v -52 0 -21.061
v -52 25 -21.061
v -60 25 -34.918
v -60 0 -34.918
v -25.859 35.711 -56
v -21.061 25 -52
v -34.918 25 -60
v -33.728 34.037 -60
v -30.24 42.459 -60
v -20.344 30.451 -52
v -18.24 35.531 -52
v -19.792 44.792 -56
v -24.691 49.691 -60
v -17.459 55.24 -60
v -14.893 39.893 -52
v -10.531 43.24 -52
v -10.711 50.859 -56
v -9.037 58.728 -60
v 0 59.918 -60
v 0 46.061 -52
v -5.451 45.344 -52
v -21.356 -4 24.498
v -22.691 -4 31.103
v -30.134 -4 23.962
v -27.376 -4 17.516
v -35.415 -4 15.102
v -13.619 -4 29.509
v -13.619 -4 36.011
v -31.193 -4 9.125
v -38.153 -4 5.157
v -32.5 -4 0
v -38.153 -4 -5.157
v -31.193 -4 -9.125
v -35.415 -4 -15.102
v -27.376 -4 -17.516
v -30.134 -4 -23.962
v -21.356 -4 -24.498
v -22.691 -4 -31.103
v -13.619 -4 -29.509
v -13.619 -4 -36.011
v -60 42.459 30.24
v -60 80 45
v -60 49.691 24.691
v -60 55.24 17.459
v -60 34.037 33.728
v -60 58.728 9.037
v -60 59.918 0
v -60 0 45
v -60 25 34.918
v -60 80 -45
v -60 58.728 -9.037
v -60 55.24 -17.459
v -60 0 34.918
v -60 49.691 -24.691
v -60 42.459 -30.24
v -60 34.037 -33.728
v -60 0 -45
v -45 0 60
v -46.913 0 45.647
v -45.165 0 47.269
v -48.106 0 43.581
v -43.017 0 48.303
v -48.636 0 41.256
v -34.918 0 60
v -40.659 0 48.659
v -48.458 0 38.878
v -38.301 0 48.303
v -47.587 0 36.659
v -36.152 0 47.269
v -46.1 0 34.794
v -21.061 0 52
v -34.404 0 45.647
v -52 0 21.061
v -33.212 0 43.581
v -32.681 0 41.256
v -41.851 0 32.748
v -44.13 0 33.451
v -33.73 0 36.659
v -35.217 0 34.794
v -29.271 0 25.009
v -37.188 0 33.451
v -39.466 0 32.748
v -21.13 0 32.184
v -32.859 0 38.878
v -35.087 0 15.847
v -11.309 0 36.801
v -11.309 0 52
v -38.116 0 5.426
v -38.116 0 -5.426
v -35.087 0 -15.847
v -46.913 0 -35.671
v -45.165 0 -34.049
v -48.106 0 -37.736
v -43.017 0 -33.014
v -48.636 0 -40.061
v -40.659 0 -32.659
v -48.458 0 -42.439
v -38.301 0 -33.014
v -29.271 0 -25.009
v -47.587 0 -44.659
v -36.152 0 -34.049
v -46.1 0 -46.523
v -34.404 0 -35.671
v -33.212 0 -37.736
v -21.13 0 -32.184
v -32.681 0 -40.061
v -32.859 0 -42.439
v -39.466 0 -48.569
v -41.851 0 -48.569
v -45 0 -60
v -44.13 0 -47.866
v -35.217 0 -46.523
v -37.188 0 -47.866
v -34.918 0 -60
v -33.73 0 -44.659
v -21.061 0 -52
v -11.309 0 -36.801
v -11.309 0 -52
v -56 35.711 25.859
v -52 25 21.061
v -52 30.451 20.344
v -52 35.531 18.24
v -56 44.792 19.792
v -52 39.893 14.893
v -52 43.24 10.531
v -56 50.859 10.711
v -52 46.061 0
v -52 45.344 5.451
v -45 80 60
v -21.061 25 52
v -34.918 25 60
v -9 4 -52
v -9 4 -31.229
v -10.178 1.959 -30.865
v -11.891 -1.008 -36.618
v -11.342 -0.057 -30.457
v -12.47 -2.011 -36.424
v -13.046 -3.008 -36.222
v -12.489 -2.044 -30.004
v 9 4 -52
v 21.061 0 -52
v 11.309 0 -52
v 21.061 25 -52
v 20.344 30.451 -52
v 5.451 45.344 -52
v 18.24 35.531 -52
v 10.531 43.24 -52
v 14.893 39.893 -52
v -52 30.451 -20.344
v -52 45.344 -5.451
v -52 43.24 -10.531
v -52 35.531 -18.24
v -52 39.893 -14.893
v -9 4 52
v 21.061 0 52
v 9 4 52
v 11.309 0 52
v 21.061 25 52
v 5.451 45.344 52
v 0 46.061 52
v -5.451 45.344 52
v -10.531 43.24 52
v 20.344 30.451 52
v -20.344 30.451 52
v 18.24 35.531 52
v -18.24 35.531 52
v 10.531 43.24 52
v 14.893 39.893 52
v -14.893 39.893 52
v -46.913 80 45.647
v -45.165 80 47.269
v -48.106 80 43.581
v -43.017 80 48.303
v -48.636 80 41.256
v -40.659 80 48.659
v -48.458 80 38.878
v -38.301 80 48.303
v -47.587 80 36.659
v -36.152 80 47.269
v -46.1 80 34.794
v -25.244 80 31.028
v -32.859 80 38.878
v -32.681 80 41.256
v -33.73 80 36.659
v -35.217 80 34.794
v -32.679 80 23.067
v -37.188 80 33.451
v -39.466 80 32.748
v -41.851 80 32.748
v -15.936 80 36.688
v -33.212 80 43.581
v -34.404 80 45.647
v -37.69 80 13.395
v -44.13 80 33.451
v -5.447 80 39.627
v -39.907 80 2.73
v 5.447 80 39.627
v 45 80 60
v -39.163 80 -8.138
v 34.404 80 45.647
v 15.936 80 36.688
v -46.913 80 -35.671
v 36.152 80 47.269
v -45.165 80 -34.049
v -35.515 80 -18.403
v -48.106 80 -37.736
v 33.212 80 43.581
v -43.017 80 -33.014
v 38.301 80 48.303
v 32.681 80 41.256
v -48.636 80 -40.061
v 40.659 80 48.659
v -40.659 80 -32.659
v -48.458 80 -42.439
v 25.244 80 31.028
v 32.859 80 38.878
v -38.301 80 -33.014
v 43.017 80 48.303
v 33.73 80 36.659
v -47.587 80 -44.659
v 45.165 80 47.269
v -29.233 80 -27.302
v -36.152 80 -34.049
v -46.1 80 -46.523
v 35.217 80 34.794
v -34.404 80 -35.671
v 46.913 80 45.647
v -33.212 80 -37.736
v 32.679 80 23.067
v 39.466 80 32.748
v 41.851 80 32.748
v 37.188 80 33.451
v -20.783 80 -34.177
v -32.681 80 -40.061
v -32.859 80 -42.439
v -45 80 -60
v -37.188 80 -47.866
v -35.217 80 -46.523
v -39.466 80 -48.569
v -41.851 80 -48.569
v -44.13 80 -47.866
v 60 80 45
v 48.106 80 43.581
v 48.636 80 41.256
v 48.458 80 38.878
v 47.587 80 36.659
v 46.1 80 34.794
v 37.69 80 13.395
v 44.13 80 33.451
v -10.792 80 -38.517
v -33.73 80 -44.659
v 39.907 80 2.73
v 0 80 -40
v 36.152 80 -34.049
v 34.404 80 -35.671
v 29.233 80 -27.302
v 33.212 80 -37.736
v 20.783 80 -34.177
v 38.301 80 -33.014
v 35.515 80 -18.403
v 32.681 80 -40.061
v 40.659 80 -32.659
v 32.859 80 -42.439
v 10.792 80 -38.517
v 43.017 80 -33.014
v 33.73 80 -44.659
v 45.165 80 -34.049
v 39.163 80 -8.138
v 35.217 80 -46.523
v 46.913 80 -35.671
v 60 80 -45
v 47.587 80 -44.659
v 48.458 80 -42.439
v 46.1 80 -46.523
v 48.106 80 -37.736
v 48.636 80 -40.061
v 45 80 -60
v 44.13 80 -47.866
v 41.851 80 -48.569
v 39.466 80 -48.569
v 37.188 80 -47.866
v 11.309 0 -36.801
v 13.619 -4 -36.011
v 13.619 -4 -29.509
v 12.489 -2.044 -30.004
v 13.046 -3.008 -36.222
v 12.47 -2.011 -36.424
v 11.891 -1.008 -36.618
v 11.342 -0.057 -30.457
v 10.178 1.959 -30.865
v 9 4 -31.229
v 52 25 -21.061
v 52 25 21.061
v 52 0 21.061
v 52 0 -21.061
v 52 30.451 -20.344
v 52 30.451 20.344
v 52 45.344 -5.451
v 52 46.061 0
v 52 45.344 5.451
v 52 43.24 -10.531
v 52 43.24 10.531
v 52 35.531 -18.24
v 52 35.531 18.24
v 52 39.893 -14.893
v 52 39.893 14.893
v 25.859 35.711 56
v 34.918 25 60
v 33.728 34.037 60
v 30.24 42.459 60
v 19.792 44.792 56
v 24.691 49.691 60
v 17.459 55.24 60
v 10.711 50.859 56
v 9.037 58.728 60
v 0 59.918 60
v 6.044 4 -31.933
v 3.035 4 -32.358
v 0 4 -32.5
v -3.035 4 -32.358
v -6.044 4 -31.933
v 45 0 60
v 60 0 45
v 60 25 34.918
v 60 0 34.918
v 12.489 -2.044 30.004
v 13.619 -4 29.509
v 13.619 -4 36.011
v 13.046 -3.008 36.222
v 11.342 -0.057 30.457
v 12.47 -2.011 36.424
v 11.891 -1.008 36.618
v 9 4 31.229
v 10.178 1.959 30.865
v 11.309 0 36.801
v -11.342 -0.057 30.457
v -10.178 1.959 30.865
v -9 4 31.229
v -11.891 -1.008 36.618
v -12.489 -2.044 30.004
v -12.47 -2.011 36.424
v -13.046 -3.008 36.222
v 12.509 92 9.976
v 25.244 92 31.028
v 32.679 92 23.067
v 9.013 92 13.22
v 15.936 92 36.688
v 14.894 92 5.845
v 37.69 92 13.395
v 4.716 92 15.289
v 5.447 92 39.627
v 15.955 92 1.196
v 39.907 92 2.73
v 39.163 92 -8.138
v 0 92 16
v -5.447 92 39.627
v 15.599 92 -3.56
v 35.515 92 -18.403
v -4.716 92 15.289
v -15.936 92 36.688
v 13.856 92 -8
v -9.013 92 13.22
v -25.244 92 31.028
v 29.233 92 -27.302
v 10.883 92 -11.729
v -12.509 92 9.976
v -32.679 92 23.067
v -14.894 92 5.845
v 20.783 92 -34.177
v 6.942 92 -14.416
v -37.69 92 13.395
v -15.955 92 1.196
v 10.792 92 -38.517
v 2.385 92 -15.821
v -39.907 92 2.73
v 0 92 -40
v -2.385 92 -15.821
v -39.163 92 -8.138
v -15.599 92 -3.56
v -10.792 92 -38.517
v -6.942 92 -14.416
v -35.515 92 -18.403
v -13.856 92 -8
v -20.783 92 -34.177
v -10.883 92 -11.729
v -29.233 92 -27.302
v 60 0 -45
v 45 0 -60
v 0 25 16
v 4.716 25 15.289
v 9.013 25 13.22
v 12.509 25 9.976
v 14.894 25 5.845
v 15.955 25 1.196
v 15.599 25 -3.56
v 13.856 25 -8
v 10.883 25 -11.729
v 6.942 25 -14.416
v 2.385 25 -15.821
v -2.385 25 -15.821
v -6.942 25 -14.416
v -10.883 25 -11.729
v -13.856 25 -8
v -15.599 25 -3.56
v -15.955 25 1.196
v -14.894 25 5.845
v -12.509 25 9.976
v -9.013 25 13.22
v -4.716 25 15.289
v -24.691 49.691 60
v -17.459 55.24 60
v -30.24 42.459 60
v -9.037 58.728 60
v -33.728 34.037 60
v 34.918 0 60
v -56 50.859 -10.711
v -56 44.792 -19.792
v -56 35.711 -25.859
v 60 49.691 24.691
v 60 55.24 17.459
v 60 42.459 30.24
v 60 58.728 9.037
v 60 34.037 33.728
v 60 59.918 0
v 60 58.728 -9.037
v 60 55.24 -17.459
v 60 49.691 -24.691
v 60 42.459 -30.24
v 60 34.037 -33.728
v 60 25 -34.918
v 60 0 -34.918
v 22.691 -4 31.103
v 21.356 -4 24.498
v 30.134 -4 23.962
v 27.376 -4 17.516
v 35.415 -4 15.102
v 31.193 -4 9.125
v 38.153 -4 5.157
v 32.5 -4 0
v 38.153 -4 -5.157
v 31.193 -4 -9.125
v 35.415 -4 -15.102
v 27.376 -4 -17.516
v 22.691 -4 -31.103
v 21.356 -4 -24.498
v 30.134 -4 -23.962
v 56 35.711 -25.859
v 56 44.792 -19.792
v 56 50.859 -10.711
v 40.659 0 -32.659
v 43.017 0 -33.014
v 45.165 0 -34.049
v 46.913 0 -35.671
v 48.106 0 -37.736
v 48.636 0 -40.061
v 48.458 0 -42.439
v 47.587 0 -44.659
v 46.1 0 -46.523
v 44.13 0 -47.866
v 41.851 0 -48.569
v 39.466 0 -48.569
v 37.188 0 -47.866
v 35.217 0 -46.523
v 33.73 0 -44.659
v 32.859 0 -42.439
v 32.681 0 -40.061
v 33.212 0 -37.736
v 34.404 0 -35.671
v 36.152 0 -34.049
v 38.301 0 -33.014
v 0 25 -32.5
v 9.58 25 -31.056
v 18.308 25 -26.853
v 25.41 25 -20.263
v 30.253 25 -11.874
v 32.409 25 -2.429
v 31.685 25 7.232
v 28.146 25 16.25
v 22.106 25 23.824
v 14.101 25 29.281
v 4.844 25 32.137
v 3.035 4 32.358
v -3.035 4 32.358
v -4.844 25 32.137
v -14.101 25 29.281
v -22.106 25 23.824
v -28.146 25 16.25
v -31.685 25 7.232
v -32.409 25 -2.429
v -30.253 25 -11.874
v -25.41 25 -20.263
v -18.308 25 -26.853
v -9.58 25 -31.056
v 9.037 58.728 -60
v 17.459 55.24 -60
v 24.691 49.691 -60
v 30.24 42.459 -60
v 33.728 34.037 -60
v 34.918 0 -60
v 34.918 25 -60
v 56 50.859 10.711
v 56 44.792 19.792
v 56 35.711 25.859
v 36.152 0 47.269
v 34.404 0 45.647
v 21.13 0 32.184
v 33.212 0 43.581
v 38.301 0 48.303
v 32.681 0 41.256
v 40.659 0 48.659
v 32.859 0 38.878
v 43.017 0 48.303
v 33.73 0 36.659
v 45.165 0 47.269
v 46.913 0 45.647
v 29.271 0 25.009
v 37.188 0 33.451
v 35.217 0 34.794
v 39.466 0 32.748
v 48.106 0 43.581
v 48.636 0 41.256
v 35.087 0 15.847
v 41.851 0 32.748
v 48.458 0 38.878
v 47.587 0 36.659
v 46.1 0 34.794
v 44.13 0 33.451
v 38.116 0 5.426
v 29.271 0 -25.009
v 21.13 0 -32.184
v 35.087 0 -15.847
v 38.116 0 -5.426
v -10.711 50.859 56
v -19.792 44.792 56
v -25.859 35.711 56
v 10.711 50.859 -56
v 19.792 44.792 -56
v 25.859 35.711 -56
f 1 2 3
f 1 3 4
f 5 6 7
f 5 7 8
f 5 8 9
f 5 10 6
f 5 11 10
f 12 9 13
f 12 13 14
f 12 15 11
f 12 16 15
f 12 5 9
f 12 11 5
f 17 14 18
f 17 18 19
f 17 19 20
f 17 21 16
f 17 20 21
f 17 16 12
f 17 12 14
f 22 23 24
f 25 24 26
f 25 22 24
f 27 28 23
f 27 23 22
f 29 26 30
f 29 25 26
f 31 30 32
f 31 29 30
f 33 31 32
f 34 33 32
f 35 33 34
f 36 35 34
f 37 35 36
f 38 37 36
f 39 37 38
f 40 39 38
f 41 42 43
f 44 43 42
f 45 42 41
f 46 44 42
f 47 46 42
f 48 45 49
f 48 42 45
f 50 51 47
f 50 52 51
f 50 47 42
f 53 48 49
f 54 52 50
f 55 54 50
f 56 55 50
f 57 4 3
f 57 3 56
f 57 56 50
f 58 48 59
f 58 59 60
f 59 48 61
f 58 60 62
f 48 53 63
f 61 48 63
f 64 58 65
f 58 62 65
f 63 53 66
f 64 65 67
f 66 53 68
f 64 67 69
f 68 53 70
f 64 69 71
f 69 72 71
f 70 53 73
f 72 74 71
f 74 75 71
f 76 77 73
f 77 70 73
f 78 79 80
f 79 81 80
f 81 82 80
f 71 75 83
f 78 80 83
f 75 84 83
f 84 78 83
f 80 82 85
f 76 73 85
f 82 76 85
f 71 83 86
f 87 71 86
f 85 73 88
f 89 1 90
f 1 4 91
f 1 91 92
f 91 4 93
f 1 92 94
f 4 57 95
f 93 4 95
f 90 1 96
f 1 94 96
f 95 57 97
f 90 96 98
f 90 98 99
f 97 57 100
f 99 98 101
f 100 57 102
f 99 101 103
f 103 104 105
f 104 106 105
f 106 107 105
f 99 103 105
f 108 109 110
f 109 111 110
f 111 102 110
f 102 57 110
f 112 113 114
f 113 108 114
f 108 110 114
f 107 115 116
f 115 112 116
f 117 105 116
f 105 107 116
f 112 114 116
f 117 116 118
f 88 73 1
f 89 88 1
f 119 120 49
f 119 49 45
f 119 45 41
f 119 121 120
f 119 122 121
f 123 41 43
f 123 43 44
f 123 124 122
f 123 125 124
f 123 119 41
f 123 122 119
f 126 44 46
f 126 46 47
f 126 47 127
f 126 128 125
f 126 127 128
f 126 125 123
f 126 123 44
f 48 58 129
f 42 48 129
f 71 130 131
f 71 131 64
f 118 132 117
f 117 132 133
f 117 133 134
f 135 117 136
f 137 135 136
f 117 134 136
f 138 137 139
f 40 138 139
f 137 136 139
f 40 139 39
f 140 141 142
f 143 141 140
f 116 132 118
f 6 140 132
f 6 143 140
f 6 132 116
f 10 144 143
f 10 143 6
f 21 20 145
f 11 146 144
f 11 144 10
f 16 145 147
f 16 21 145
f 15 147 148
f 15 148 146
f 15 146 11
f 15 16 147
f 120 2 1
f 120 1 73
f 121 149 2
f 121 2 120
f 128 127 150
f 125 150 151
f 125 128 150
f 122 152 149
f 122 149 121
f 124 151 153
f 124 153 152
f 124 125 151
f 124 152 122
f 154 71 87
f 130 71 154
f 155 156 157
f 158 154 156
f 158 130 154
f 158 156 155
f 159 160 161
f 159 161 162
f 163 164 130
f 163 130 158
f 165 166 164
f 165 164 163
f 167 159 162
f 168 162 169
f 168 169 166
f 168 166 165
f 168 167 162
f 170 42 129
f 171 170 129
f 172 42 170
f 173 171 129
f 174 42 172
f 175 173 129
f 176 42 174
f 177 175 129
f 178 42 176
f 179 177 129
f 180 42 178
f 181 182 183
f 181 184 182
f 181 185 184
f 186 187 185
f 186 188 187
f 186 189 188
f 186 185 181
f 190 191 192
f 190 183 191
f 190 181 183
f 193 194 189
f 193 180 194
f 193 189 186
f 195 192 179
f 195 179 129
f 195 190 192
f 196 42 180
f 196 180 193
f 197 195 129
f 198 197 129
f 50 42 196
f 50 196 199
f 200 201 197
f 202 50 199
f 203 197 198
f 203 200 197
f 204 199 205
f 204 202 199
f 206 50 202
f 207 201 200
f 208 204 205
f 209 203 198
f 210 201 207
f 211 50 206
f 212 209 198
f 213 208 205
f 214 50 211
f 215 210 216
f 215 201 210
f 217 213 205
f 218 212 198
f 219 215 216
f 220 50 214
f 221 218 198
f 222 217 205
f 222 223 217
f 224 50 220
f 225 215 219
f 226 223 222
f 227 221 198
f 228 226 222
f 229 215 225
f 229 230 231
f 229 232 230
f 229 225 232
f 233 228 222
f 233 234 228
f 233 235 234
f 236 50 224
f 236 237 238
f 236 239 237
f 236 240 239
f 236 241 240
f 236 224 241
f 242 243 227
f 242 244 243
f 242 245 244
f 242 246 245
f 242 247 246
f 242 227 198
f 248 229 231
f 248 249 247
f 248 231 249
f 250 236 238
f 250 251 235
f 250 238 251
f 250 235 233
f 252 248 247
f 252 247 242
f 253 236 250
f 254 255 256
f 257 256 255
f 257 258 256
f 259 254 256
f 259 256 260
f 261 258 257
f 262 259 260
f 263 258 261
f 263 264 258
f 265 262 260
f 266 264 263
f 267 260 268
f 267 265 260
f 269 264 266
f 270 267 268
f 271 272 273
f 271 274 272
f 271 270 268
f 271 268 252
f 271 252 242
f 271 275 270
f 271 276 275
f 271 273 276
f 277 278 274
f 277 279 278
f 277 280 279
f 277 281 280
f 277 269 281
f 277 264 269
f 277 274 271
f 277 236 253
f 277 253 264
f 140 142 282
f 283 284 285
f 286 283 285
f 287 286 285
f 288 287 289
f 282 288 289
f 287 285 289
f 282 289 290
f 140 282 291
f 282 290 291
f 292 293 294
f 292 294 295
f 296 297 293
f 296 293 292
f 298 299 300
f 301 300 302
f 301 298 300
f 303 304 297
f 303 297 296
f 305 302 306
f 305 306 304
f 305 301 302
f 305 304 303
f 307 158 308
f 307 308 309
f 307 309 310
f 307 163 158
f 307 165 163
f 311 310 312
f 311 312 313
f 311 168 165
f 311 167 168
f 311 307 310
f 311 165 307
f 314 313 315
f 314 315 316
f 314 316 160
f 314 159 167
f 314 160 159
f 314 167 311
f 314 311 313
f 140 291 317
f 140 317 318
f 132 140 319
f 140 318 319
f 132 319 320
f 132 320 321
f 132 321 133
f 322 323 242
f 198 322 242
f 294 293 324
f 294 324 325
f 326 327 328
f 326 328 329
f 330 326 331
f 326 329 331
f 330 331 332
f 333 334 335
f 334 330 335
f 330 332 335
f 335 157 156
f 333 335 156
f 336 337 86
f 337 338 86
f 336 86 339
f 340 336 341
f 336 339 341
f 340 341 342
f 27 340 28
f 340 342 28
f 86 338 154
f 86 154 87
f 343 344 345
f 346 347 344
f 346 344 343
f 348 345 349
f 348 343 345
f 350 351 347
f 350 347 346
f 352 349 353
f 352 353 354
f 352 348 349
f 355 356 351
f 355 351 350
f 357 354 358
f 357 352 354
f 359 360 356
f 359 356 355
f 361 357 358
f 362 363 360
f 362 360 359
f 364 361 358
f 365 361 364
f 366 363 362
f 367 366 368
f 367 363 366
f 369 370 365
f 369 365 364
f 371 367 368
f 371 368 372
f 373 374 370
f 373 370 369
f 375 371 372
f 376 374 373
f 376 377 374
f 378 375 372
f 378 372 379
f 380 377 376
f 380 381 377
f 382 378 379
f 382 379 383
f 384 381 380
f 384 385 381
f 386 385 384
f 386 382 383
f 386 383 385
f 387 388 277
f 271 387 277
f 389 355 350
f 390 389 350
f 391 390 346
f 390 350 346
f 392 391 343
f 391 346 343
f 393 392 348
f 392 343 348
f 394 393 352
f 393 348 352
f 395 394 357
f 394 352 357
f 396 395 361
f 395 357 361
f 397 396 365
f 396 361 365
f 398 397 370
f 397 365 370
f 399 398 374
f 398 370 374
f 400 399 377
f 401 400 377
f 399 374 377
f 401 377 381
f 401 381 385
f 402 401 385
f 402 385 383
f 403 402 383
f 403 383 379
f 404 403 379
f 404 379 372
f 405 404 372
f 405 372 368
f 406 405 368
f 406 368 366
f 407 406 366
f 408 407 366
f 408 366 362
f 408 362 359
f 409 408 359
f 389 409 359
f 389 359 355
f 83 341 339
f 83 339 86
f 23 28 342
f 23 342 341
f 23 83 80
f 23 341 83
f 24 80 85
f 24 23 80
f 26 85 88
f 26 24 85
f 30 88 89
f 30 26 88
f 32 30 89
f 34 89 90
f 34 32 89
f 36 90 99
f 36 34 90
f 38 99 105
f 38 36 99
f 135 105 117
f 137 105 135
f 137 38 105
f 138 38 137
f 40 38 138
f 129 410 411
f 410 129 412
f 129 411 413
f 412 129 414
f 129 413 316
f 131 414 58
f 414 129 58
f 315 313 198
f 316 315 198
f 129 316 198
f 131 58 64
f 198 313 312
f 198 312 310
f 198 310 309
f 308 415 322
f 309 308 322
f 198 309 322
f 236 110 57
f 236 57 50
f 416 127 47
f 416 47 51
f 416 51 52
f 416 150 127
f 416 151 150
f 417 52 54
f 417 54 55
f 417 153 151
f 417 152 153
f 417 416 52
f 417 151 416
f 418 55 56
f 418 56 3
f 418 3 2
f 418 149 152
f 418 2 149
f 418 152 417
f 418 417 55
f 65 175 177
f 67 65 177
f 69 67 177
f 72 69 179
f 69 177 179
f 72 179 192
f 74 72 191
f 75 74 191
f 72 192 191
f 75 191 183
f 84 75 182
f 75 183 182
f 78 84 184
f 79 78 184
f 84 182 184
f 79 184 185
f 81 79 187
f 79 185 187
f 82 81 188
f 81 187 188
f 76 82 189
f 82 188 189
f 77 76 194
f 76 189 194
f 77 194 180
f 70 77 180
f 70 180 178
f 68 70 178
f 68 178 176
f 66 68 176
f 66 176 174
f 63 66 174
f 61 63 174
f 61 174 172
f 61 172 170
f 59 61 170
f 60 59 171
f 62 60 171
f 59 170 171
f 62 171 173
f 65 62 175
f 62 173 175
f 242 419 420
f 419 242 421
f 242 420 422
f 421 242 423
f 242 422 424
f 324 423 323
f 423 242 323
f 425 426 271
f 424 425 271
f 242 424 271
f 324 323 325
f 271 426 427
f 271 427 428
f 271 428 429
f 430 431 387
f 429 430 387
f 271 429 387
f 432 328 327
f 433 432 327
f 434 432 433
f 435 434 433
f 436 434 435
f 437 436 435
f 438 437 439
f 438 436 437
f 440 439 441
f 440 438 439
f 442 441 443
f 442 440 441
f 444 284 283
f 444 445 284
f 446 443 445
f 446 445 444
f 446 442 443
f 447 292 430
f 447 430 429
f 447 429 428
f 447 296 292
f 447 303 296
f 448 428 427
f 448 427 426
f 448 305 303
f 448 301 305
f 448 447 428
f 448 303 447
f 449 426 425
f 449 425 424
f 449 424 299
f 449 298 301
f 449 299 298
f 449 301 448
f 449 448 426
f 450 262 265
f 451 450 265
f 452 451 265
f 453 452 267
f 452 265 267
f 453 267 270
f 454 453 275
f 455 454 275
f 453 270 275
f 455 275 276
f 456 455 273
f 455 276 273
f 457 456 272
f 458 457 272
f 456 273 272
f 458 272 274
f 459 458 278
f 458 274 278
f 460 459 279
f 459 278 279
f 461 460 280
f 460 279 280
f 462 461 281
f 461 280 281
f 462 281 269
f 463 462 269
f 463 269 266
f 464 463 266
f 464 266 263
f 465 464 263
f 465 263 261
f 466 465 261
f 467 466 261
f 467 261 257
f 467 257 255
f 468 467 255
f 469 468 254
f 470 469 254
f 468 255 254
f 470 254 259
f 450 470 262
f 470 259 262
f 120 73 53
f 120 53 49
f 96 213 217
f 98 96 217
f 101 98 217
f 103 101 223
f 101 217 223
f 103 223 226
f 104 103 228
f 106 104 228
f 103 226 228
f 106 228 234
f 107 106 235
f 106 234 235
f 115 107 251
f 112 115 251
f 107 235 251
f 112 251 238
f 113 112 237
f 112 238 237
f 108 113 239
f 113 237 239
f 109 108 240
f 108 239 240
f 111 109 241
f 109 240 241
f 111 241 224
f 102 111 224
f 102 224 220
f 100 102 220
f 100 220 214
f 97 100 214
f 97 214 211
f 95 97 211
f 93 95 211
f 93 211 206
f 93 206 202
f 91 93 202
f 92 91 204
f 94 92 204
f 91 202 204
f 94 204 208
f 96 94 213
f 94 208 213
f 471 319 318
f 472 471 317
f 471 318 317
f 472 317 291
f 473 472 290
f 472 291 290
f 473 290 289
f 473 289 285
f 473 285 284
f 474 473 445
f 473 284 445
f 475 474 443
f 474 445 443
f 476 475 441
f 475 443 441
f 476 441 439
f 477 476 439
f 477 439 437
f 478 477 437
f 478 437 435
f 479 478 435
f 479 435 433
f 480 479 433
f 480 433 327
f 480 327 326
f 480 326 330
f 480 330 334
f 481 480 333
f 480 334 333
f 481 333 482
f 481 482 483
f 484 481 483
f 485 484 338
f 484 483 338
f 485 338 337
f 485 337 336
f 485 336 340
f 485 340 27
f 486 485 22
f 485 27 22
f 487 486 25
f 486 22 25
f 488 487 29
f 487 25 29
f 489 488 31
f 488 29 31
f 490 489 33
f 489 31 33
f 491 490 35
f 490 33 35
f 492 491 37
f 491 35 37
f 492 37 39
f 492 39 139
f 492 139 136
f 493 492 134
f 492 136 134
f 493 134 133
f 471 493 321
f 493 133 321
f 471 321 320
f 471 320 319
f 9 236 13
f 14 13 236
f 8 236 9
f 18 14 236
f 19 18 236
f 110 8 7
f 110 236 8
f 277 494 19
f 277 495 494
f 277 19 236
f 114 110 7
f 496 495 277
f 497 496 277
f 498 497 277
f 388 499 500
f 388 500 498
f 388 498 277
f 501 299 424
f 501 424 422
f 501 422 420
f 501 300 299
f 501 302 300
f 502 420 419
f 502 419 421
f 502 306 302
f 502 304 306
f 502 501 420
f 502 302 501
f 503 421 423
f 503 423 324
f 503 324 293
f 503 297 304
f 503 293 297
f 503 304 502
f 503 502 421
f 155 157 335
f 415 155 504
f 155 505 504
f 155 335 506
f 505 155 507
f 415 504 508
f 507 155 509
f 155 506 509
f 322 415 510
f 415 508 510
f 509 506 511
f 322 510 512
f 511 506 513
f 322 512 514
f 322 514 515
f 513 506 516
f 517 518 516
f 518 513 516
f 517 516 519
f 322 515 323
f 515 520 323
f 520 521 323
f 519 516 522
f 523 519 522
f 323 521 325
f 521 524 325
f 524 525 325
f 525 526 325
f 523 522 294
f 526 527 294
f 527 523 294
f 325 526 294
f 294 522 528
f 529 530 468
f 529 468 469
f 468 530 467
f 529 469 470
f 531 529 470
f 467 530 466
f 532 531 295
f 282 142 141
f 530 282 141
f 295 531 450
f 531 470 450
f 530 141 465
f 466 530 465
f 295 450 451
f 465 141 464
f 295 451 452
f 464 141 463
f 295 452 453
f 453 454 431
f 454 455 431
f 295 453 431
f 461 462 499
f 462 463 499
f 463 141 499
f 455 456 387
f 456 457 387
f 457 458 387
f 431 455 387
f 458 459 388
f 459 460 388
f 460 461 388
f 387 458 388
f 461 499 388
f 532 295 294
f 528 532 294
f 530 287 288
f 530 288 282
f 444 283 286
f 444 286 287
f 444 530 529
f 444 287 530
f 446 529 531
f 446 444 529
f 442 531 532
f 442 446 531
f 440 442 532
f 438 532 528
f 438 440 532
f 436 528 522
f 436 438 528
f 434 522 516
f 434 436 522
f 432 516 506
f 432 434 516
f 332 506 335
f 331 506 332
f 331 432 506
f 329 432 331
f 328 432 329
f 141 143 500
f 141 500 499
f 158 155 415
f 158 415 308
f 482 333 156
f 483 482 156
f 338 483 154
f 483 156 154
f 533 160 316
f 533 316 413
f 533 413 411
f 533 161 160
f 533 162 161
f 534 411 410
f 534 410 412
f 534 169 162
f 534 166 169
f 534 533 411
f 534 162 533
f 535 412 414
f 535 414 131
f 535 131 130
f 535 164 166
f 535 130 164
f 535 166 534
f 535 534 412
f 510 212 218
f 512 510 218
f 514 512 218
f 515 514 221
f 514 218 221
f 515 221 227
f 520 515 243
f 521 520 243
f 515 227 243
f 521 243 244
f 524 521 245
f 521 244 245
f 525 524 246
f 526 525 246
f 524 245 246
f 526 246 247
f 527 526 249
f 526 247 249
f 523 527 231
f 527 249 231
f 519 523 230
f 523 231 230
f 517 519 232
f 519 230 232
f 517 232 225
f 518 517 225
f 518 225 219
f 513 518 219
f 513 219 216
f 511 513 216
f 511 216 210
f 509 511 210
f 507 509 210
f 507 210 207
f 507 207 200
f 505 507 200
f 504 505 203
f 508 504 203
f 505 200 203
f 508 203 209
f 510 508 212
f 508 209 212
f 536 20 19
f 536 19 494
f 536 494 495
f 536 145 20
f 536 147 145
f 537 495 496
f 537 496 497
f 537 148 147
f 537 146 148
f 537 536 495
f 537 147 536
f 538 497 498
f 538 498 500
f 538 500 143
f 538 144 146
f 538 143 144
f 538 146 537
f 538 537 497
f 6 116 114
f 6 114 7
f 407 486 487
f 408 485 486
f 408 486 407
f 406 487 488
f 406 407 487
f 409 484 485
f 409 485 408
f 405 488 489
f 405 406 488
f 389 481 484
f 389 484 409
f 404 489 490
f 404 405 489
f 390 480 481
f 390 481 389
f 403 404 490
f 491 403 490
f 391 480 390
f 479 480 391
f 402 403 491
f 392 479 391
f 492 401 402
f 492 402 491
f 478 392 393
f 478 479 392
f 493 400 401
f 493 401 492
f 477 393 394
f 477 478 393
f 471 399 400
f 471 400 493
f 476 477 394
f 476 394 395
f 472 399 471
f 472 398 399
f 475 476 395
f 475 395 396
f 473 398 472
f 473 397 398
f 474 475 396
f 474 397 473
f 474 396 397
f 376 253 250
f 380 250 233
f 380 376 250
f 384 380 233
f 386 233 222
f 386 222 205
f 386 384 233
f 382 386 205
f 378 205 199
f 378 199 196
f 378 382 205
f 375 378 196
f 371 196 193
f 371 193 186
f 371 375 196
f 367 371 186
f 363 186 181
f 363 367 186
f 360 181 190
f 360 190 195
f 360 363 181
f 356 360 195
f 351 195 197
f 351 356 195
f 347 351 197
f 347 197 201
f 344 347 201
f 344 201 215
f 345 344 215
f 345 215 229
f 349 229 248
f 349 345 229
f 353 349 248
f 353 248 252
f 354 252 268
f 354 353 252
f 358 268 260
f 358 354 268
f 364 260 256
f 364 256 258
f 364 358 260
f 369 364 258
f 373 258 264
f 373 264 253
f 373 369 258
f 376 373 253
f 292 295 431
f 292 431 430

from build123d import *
from OCP.BRepFilletAPI import BRepFilletAPI_MakeChamfer

# Parameters (mm, degrees)
SKETCH1_W                      = 120
SKETCH1_H                      = 120
BOSS_EXTRUDE1_DEPTH            = 80
CHAMFER1_SIZE                  = 15
SKETCH2_R                      = 8
SKETCH2_R_2                    = 16
CUT_EXTRUDE1_DEPTH             = 80
CUT_EXTRUDE2_DEPTH             = 8
CHAMFER3_SIZE                  = 13.856406461
CHAMFER3_SIZE_2                = 8
CIRPATTERN2_COUNT              = 4
CHAMFER3_OF_CIRPATTERN2_SIZE   = 13.856406461
CHAMFER3_OF_CIRPATTERN2_SIZE_2 = 8
BOSS_EXTRUDE2_START            = 12
SKETCH5_R                      = 40
SKETCH5_R_2                    = 16
BOSS_EXTRUDE2_DEPTH            = 12
SKETCH6_R                      = 32.5
CUT_EXTRUDE3_DEPTH             = 25
BOSS_EXTRUDE3_START            = 4
SKETCH17_R                     = 38.5
SKETCH17_R_2                   = 32.5
BOSS_EXTRUDE3_DEPTH            = 4
CUT_EXTRUDE4_DEPTH             = 156


with BuildPart() as part:
    # Sketch1 → Boss-Extrude1 (new body)
    with BuildSketch(Plane(origin=(0, 0, 0), x_dir=(1, 0, 0), z_dir=(0, 1, 0))):
        Rectangle(SKETCH1_W, SKETCH1_H)
    extrude(amount=BOSS_EXTRUDE1_DEPTH)

    # Chamfer1
    chamfer1_edges = [part.edges().sort_by_distance(p)[0] for p in [
        (60, 40, 60),
        (-60, 40, 60),
        (-60, 40, -60),
        (60, 40, -60),
    ]]
    chamfer(chamfer1_edges, length=CHAMFER1_SIZE)

    # Sketch2 → Cut-Extrude1 (cut)
    with BuildSketch(Plane(origin=(0, 80, 0), x_dir=(1, 0, 0), z_dir=(0, 1, 0))):
        with Locations(Location((-40.658639918, 40.658639918, 0), (0, 0, 270))):
            Circle(SKETCH2_R)
        with Locations(Location((40.658639918, 40.658639918, 0), (0, 0, 270))):
            Circle(SKETCH2_R)
        with Locations(Location((40.658639918, -40.658639918, 0), (0, 0, 270))):
            Circle(SKETCH2_R)
        with Locations(Location((-40.658639918, -40.658639918, 0), (0, 0, 270))):
            Circle(SKETCH2_R)
        with Locations(Location((0, 0, 0), (0, 0, 270))):
            Circle(SKETCH2_R_2)
    extrude(amount=-CUT_EXTRUDE1_DEPTH, mode=Mode.SUBTRACT)

    # Sketch3 → Cut-Extrude2 (cut)
    with BuildSketch(Plane(origin=(60, 0, 0), x_dir=(0, 0, -1), z_dir=(1, 0, 0))):
        with BuildLine():
            Line((-21.061459243, 25), (-21.061459243, 0))
            Line((-21.061459243, 0), (0, 0))
            Line((0, 0), (0, 46.061459243))
            ThreePointArc((0, 46.061459243), (-14.892700652, 39.892700652), (-21.061459243, 25))
        make_face()
        with BuildLine():
            Line((0, 46.061459243), (0, 0))
            Line((0, 0), (21.061459243, 0))
            Line((21.061459243, 0), (21.061459243, 25))
            ThreePointArc((21.061459243, 25), (14.892700652, 39.892700652), (0, 46.061459243))
        make_face()
    cut_extrude2 = extrude(amount=-CUT_EXTRUDE2_DEPTH, mode=Mode.SUBTRACT)

    # Chamfer3
    chamfer3_edges_1 = [part.edges().sort_by_distance(p)[0] for p in [
        (60, 12.5, 21.061459243),
    ]]
    chamfer3_side_1 = [part.faces().sort_by_distance(p)[0] for p in [
        (60, 12.5, 21.221459243),
    ]]
    chamfer3_edges_2 = [part.edges().sort_by_distance(p)[0] for p in [
        (60, 46.061459243, 0),
    ]]
    chamfer3_side_2 = [part.faces().sort_by_distance(p)[0] for p in [
        (60, 46.221459243, 0),
    ]]
    chamfer3_edges_3 = [part.edges().sort_by_distance(p)[0] for p in [
        (60, 12.5, -21.061459243),
    ]]
    chamfer3_side_3 = [part.faces().sort_by_distance(p)[0] for p in [
        (60, 12.5, -21.221459243),
    ]]
    chamfer3 = BRepFilletAPI_MakeChamfer(part.part.solid().wrapped)
    for e in chamfer3_edges_1:
        chamfer3.Add(CHAMFER3_SIZE - 0.0001, CHAMFER3_SIZE_2 - 0.0001, e.wrapped, chamfer3_side_1[0].wrapped)
    for e in chamfer3_edges_2:
        chamfer3.Add(CHAMFER3_SIZE - 0.0001, CHAMFER3_SIZE_2 - 0.0001, e.wrapped, chamfer3_side_2[0].wrapped)
    for e in chamfer3_edges_3:
        chamfer3.Add(CHAMFER3_SIZE - 0.0001, CHAMFER3_SIZE_2 - 0.0001, e.wrapped, chamfer3_side_3[0].wrapped)
    add(Compound.cast(chamfer3.Shape()), mode=Mode.REPLACE)  # a hair under: the kernel refuses the full size

    # CirPattern2: Cut-Extrude2 ×4 about axis
    cirpattern2_axis = Axis((0, 0, 0), (0, 1, 0))
    for i in range(1, CIRPATTERN2_COUNT):
        add(cut_extrude2.rotate(cirpattern2_axis, i * 360 / CIRPATTERN2_COUNT), mode=Mode.SUBTRACT)

    # Chamfer3 of CirPattern2
    chamfer3_of_cirpattern2_edges_1 = [part.edges().sort_by_distance(p)[0] for p in [
        (21.061459243, 12.5, -60),
    ]]
    chamfer3_of_cirpattern2_side_1 = [part.faces().sort_by_distance(p)[0] for p in [
        (21.221459243, 12.5, -60),
    ]]
    chamfer3_of_cirpattern2_edges_2 = [part.edges().sort_by_distance(p)[0] for p in [
        (0, 46.061459243, -60),
    ]]
    chamfer3_of_cirpattern2_side_2 = [part.faces().sort_by_distance(p)[0] for p in [
        (0, 46.221459243, -60),
    ]]
    chamfer3_of_cirpattern2_edges_3 = [part.edges().sort_by_distance(p)[0] for p in [
        (-21.061459243, 12.5, -60),
    ]]
    chamfer3_of_cirpattern2_side_3 = [part.faces().sort_by_distance(p)[0] for p in [
        (-21.221459243, 12.5, -60),
    ]]
    chamfer3_of_cirpattern2_edges_4 = [part.edges().sort_by_distance(p)[0] for p in [
        (-60, 12.5, -21.061459243),
    ]]
    chamfer3_of_cirpattern2_side_4 = [part.faces().sort_by_distance(p)[0] for p in [
        (-60, 12.5, -21.221459243),
    ]]
    chamfer3_of_cirpattern2_edges_5 = [part.edges().sort_by_distance(p)[0] for p in [
        (-60, 46.061459243, 0),
    ]]
    chamfer3_of_cirpattern2_side_5 = [part.faces().sort_by_distance(p)[0] for p in [
        (-60, 46.221459243, 0),
    ]]
    chamfer3_of_cirpattern2_edges_6 = [part.edges().sort_by_distance(p)[0] for p in [
        (-60, 12.5, 21.061459243),
    ]]
    chamfer3_of_cirpattern2_side_6 = [part.faces().sort_by_distance(p)[0] for p in [
        (-60, 12.5, 21.221459243),
    ]]
    chamfer3_of_cirpattern2_edges_7 = [part.edges().sort_by_distance(p)[0] for p in [
        (-21.061459243, 12.5, 60),
    ]]
    chamfer3_of_cirpattern2_side_7 = [part.faces().sort_by_distance(p)[0] for p in [
        (-21.221459243, 12.5, 60),
    ]]
    chamfer3_of_cirpattern2_edges_8 = [part.edges().sort_by_distance(p)[0] for p in [
        (0, 46.061459243, 60),
    ]]
    chamfer3_of_cirpattern2_side_8 = [part.faces().sort_by_distance(p)[0] for p in [
        (0, 46.221459243, 60),
    ]]
    chamfer3_of_cirpattern2_edges_9 = [part.edges().sort_by_distance(p)[0] for p in [
        (21.061459243, 12.5, 60),
    ]]
    chamfer3_of_cirpattern2_side_9 = [part.faces().sort_by_distance(p)[0] for p in [
        (21.221459243, 12.5, 60),
    ]]
    chamfer3_of_cirpattern2 = BRepFilletAPI_MakeChamfer(part.part.solid().wrapped)
    for e in chamfer3_of_cirpattern2_edges_1:
        chamfer3_of_cirpattern2.Add(CHAMFER3_OF_CIRPATTERN2_SIZE - 0.0001, CHAMFER3_OF_CIRPATTERN2_SIZE_2 - 0.0001, e.wrapped, chamfer3_of_cirpattern2_side_1[0].wrapped)
    for e in chamfer3_of_cirpattern2_edges_2:
        chamfer3_of_cirpattern2.Add(CHAMFER3_OF_CIRPATTERN2_SIZE - 0.0001, CHAMFER3_OF_CIRPATTERN2_SIZE_2 - 0.0001, e.wrapped, chamfer3_of_cirpattern2_side_2[0].wrapped)
    for e in chamfer3_of_cirpattern2_edges_3:
        chamfer3_of_cirpattern2.Add(CHAMFER3_OF_CIRPATTERN2_SIZE - 0.0001, CHAMFER3_OF_CIRPATTERN2_SIZE_2 - 0.0001, e.wrapped, chamfer3_of_cirpattern2_side_3[0].wrapped)
    for e in chamfer3_of_cirpattern2_edges_4:
        chamfer3_of_cirpattern2.Add(CHAMFER3_OF_CIRPATTERN2_SIZE - 0.0001, CHAMFER3_OF_CIRPATTERN2_SIZE_2 - 0.0001, e.wrapped, chamfer3_of_cirpattern2_side_4[0].wrapped)
    for e in chamfer3_of_cirpattern2_edges_5:
        chamfer3_of_cirpattern2.Add(CHAMFER3_OF_CIRPATTERN2_SIZE - 0.0001, CHAMFER3_OF_CIRPATTERN2_SIZE_2 - 0.0001, e.wrapped, chamfer3_of_cirpattern2_side_5[0].wrapped)
    for e in chamfer3_of_cirpattern2_edges_6:
        chamfer3_of_cirpattern2.Add(CHAMFER3_OF_CIRPATTERN2_SIZE - 0.0001, CHAMFER3_OF_CIRPATTERN2_SIZE_2 - 0.0001, e.wrapped, chamfer3_of_cirpattern2_side_6[0].wrapped)
    for e in chamfer3_of_cirpattern2_edges_7:
        chamfer3_of_cirpattern2.Add(CHAMFER3_OF_CIRPATTERN2_SIZE - 0.0001, CHAMFER3_OF_CIRPATTERN2_SIZE_2 - 0.0001, e.wrapped, chamfer3_of_cirpattern2_side_7[0].wrapped)
    for e in chamfer3_of_cirpattern2_edges_8:
        chamfer3_of_cirpattern2.Add(CHAMFER3_OF_CIRPATTERN2_SIZE - 0.0001, CHAMFER3_OF_CIRPATTERN2_SIZE_2 - 0.0001, e.wrapped, chamfer3_of_cirpattern2_side_8[0].wrapped)
    for e in chamfer3_of_cirpattern2_edges_9:
        chamfer3_of_cirpattern2.Add(CHAMFER3_OF_CIRPATTERN2_SIZE - 0.0001, CHAMFER3_OF_CIRPATTERN2_SIZE_2 - 0.0001, e.wrapped, chamfer3_of_cirpattern2_side_9[0].wrapped)
    add(Compound.cast(chamfer3_of_cirpattern2.Shape()), mode=Mode.REPLACE)  # a hair under: the kernel refuses the full size

    # Sketch5 → Boss-Extrude2 (add)
    with BuildSketch(Plane(origin=(0, 80, 0), x_dir=(1, 0, 0), z_dir=(0, 1, 0)).offset(BOSS_EXTRUDE2_START)):
        with Locations(Location((0, 0, 0), (0, 0, 90))):
            Circle(SKETCH5_R)
        with Locations(Location((0, 0, 0), (0, 0, 270))):
            Circle(SKETCH5_R_2, mode=Mode.SUBTRACT)
    extrude(amount=-BOSS_EXTRUDE2_DEPTH)

    # Sketch6 → Cut-Extrude3 (cut)
    with BuildSketch(Plane.XZ):
        with Locations(Location((0, 0, 0), (0, 0, 270))):
            Circle(SKETCH6_R)
    extrude(amount=-CUT_EXTRUDE3_DEPTH, mode=Mode.SUBTRACT)

    # Sketch17 → Boss-Extrude3 (add)
    with BuildSketch(Plane.XZ.offset(BOSS_EXTRUDE3_START)):
        with Locations(Location((0, 0, 0), (0, 0, 270))):
            Circle(SKETCH17_R)
        with Locations(Location((0, 0, 0), (0, 0, 270))):
            Circle(SKETCH17_R_2, mode=Mode.SUBTRACT)
    extrude(amount=-BOSS_EXTRUDE3_DEPTH)

    # Sketch18 → Cut-Extrude4 (cut)
    with BuildSketch(Plane.XY.offset(52)):
        Polygon((9, 4), (0, 4), (0, 0), (11.309401077, 0), align=None)
        Polygon((0, 4), (-9, 4), (-11.309401077, 0), (0, 0), align=None)
        Polygon((0, 0), (-11.309401077, 0), (-13.618802154, -4), (0, -4), align=None)
        Polygon((11.309401077, 0), (0, 0), (0, -4), (13.618802154, -4), align=None)
    extrude(amount=-CUT_EXTRUDE4_DEPTH, mode=Mode.SUBTRACT)


solid = part.part
